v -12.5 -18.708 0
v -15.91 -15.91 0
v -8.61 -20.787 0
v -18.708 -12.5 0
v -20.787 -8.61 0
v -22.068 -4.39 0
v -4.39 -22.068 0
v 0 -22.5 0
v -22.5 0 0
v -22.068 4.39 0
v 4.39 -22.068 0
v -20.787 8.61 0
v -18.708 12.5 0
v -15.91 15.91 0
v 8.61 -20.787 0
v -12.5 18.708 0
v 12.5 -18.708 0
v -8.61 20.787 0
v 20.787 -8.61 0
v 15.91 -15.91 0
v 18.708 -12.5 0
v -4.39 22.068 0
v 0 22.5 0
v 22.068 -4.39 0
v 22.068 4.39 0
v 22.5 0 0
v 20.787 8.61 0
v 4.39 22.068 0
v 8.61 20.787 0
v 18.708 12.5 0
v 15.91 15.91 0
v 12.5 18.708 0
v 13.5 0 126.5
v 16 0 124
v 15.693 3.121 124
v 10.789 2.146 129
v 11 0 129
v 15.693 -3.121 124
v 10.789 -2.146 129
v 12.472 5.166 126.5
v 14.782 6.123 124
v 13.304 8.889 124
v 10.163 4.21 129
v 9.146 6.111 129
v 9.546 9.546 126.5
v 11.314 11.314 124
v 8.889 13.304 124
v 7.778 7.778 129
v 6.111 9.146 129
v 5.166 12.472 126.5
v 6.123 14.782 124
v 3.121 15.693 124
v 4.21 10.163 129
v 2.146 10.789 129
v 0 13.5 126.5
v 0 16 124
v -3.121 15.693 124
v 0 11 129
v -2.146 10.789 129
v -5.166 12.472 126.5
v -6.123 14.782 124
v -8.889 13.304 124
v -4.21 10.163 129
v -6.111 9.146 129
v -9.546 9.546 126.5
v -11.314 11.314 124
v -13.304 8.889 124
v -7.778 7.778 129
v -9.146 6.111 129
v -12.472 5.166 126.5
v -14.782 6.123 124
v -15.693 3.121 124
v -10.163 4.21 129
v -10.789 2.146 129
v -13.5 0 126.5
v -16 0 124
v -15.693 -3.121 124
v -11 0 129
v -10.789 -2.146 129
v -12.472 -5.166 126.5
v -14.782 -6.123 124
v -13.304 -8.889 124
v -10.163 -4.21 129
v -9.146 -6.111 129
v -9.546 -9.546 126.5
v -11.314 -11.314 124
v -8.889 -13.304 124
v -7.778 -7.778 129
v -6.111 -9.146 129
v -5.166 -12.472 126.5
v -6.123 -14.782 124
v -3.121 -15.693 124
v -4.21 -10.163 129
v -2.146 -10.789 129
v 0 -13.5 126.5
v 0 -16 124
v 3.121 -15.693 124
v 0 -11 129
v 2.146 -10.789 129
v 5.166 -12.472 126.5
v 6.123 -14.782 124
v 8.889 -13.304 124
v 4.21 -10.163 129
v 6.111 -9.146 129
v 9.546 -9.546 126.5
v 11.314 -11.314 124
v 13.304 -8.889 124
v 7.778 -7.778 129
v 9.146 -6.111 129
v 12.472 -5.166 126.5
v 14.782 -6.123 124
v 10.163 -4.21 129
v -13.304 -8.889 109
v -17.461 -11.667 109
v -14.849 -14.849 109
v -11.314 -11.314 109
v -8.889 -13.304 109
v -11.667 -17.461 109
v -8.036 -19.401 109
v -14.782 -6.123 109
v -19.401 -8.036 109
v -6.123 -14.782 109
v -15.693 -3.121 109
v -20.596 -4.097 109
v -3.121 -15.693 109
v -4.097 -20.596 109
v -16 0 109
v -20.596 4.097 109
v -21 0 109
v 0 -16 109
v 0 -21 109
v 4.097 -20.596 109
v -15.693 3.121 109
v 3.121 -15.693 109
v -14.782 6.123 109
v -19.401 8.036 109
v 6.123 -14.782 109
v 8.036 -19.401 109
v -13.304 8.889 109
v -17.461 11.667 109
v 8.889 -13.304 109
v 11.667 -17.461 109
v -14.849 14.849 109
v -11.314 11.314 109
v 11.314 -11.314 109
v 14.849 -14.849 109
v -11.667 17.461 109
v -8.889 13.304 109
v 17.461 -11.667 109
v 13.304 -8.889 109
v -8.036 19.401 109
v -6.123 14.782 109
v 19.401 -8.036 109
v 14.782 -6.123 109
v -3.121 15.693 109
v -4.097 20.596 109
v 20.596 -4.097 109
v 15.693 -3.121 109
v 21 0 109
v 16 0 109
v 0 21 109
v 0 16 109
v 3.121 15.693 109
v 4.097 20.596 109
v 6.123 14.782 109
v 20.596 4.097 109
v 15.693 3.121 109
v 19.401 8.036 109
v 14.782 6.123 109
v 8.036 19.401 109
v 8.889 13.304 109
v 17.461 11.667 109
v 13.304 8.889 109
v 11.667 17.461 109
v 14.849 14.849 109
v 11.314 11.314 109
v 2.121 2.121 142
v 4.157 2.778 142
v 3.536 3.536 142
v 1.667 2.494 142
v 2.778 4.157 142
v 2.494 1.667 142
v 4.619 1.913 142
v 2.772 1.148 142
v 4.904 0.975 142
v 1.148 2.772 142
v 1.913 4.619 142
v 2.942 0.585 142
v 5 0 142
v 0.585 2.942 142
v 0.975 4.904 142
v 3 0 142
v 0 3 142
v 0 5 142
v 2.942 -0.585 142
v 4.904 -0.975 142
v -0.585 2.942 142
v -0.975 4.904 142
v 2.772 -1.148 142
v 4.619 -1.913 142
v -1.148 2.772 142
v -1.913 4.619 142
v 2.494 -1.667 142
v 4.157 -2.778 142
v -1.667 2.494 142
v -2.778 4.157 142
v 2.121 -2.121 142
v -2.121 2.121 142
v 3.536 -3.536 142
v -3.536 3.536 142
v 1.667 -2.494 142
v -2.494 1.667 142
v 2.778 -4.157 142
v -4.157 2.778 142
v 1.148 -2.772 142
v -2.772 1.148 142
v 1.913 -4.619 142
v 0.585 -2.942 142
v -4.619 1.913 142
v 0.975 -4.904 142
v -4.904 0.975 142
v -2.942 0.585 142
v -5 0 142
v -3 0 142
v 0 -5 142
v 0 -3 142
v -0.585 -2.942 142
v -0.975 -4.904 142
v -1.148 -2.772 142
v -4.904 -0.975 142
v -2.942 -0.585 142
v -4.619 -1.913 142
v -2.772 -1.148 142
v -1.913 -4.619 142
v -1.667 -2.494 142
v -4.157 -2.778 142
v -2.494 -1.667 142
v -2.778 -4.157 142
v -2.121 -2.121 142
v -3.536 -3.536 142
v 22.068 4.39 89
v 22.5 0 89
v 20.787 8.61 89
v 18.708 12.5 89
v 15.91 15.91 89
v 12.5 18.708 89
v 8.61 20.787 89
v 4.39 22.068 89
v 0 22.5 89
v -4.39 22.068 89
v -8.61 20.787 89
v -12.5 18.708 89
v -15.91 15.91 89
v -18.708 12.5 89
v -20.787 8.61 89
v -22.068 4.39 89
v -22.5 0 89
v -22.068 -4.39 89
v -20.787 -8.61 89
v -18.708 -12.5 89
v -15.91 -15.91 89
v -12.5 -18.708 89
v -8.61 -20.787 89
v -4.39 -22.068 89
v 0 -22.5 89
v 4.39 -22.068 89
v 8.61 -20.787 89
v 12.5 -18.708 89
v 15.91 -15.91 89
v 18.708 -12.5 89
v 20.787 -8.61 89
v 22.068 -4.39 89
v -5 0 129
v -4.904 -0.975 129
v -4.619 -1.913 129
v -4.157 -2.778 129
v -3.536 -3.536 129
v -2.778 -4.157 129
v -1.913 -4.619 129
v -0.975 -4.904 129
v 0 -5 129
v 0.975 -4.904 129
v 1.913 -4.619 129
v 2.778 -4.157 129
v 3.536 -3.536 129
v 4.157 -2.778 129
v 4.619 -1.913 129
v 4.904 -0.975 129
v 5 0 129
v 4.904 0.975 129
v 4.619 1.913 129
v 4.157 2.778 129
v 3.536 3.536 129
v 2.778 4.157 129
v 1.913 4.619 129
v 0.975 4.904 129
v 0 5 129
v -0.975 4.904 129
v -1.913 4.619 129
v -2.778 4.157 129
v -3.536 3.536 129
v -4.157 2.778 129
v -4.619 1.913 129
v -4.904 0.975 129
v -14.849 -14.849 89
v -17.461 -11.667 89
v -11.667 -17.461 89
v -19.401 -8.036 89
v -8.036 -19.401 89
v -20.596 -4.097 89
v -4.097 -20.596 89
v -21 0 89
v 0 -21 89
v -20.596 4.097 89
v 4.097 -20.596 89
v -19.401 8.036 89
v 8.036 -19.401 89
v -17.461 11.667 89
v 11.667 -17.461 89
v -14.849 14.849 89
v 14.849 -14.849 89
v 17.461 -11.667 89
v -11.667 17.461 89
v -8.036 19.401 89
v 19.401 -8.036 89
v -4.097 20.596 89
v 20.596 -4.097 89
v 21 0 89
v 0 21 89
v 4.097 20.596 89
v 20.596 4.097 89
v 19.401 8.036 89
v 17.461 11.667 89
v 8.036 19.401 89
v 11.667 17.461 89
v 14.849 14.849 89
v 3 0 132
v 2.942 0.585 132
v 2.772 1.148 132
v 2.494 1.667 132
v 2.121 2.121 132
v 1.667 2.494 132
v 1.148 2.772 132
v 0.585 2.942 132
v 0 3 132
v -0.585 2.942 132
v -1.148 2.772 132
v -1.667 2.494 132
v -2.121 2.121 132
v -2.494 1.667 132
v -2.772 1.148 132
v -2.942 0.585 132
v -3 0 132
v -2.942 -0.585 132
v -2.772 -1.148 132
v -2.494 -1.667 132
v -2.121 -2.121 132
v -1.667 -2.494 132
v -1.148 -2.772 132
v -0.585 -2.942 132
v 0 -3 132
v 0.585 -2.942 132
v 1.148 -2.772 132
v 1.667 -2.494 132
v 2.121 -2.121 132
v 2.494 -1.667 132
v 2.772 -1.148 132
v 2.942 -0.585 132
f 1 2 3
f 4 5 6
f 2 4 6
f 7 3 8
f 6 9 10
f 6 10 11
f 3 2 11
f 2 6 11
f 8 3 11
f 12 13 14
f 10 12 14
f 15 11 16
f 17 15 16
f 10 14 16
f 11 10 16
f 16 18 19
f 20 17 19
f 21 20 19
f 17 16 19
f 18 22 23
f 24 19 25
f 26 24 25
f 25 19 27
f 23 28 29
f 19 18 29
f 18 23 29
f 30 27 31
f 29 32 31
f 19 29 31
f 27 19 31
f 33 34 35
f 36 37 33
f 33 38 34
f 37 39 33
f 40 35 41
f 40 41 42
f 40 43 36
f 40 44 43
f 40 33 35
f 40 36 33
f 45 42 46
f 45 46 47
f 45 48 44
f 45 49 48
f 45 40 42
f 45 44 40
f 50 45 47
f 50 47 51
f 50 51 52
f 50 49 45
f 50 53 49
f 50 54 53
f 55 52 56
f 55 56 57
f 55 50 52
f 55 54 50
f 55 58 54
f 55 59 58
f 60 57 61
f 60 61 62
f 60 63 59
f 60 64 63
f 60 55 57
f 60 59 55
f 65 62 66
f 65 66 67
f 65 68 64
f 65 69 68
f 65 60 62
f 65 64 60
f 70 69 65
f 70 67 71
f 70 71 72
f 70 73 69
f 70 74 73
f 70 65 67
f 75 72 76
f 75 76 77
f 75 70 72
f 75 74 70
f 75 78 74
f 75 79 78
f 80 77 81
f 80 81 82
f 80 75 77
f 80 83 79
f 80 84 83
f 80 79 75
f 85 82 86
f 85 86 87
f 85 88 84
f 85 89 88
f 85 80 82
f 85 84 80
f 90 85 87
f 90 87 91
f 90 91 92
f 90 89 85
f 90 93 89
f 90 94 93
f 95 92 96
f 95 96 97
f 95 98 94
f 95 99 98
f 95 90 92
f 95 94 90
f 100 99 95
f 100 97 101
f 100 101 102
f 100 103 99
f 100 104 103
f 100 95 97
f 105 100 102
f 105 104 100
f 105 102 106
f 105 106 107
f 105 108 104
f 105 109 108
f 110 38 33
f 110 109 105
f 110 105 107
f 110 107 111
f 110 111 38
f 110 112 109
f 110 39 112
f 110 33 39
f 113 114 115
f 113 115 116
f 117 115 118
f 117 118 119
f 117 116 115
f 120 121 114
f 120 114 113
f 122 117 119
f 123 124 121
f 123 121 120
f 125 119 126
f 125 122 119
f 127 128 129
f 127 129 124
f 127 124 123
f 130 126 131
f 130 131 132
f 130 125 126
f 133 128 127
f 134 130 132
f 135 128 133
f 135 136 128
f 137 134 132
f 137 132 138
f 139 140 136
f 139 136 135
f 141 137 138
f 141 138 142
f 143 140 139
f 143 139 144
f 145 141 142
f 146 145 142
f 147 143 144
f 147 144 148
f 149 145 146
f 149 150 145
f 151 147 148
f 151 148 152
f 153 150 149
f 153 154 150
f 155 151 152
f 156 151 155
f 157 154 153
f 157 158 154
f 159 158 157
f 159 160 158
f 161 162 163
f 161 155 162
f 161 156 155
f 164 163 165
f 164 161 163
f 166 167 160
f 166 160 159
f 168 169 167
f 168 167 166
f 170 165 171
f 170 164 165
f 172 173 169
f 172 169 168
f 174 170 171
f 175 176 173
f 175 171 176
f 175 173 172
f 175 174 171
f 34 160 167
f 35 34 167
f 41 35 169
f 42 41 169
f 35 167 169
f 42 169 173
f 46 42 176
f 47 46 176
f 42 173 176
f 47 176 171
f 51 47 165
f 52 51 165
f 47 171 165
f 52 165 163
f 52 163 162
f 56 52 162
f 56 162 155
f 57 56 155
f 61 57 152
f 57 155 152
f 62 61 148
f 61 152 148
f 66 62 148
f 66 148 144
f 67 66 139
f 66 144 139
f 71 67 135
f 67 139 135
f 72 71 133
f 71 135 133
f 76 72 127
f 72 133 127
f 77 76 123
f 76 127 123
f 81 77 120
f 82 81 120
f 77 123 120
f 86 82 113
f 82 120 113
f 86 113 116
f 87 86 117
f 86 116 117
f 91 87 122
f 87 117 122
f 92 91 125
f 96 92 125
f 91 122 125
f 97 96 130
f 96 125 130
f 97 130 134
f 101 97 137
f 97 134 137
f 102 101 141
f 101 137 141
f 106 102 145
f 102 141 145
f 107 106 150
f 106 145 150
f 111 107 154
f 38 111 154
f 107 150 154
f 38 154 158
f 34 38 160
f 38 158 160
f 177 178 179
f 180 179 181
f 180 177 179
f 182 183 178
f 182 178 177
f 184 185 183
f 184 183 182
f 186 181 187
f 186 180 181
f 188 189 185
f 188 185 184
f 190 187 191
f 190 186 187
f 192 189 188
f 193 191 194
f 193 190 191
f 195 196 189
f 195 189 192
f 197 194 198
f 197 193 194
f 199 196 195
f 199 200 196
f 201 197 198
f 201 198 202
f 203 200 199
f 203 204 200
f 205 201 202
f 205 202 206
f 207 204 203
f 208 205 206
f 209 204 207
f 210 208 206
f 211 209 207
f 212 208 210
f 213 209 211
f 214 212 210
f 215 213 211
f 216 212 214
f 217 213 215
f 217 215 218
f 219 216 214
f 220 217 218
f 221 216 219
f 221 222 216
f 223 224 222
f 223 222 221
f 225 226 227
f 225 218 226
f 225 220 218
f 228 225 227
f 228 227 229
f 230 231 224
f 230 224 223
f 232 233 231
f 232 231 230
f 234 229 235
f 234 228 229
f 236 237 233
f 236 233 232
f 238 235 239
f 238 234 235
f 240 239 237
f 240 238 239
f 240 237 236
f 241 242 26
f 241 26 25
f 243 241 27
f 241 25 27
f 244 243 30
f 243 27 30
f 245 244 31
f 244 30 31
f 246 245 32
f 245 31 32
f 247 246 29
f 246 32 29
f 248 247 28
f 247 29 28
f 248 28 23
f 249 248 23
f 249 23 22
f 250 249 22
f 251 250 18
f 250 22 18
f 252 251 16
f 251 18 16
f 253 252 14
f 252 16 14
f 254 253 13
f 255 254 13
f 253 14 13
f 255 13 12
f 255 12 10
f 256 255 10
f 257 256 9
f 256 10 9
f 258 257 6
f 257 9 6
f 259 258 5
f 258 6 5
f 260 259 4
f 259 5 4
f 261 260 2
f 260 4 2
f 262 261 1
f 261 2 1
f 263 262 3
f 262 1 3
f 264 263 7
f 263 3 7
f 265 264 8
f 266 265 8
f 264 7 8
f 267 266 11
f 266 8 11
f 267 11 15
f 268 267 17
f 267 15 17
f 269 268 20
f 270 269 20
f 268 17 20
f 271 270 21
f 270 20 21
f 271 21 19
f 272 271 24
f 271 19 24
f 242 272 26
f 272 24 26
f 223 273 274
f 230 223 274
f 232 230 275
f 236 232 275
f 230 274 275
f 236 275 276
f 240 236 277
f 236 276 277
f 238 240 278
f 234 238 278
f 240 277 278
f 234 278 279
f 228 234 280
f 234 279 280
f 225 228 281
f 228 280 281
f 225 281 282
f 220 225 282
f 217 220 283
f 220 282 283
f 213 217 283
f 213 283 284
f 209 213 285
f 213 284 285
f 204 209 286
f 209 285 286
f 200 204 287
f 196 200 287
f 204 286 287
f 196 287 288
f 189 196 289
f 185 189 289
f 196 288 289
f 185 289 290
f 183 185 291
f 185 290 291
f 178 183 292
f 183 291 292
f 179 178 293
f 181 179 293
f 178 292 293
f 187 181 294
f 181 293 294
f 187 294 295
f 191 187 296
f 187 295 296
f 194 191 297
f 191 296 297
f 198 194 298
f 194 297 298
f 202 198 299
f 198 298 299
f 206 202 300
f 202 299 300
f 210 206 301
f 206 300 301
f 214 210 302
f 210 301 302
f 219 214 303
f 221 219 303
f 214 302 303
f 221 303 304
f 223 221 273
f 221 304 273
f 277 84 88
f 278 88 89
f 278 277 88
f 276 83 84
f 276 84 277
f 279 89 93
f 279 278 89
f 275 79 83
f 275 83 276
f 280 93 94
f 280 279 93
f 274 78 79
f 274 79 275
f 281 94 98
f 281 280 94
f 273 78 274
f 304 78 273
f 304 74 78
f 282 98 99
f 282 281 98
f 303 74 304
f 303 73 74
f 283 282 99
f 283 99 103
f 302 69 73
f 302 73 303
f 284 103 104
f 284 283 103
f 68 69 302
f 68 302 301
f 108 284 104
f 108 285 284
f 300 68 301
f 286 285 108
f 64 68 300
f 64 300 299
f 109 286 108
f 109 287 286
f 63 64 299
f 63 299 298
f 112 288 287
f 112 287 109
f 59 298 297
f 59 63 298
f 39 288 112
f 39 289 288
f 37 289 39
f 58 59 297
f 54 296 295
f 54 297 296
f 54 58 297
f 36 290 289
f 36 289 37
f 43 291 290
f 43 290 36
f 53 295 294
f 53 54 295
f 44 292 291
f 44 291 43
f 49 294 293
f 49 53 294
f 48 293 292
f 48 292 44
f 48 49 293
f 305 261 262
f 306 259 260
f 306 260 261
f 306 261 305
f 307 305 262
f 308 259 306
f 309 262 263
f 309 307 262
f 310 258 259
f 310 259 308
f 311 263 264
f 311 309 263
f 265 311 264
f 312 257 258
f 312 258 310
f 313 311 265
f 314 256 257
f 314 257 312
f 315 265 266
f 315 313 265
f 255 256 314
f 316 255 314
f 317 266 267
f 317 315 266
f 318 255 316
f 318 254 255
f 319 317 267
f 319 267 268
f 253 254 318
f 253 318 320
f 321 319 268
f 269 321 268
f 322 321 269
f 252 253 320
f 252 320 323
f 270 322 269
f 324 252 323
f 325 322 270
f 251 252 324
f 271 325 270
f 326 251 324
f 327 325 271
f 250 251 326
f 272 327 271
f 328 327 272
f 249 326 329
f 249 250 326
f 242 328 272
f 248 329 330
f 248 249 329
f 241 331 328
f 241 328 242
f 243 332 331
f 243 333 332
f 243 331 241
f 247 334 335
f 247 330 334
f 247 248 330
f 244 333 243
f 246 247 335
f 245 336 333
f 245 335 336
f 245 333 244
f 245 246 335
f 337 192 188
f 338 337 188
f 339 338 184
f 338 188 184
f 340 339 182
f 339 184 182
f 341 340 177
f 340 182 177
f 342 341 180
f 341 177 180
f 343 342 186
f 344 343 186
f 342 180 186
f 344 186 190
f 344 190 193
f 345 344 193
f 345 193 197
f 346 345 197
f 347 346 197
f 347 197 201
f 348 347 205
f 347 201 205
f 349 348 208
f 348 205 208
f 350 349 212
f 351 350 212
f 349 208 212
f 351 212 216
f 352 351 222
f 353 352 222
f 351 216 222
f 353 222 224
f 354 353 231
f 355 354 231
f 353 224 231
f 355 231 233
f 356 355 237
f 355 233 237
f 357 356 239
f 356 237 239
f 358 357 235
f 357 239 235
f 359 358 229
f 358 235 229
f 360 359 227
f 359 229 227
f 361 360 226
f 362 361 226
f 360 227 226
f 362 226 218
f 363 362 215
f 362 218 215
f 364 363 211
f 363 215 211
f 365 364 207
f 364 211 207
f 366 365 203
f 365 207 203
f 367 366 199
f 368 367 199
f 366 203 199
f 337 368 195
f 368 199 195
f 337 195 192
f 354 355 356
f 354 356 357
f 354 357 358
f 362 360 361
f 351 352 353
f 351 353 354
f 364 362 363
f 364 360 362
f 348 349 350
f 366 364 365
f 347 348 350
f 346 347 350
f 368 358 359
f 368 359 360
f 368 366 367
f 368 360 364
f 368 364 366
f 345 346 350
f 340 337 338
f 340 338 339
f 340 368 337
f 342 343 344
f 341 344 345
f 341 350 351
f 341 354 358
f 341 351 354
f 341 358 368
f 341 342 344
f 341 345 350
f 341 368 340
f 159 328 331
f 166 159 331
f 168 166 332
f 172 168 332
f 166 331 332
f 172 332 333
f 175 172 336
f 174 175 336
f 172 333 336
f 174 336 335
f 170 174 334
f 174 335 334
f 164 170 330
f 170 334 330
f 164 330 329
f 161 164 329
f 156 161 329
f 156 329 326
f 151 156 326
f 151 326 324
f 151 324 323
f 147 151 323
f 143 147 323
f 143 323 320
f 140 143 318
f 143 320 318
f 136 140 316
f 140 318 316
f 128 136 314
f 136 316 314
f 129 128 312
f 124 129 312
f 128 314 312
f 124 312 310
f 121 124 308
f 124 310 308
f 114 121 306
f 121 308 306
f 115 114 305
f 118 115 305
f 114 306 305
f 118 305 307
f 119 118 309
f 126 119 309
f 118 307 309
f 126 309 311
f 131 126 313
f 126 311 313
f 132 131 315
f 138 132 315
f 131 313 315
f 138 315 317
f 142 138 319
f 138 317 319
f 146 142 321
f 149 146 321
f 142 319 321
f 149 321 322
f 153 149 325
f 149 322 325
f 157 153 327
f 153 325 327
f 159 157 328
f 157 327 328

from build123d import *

# Parameters (mm, degrees)
SKETCH1_R           = 22.5
BOSS_EXTRUDE1_DEPTH = 89
SKETCH2_R           = 21
BOSS_EXTRUDE2_DEPTH = 20
SKETCH3_R           = 16
BOSS_EXTRUDE3_DEPTH = 20
CHAMFER1_SIZE       = 5
SKETCH4_R           = 5
BOSS_EXTRUDE4_DEPTH = 13
SKETCH5_R           = 3
CUT_EXTRUDE1_DEPTH  = 10


with BuildPart() as part:
    # Sketch1 → Boss-Extrude1 (new body)
    with BuildSketch(Plane.XY):
        Circle(SKETCH1_R)
    extrude(amount=BOSS_EXTRUDE1_DEPTH)

    # Sketch2 → Boss-Extrude2 (add)
    with BuildSketch(Plane.XY.offset(89)):
        Circle(SKETCH2_R)
    extrude(amount=BOSS_EXTRUDE2_DEPTH)

    # Sketch3 → Boss-Extrude3 (add)
    with BuildSketch(Plane.XY.offset(109)):
        Circle(SKETCH3_R)
    extrude(amount=BOSS_EXTRUDE3_DEPTH)

    # Chamfer1
    chamfer1_edges = [part.edges().sort_by_distance(p)[0] for p in [
        (-16, 0, 129),
    ]]
    chamfer(chamfer1_edges, length=CHAMFER1_SIZE)

    # Sketch4 → Boss-Extrude4 (add)
    with BuildSketch(Plane.XY.offset(129)):
        with Locations(Location((0, 0, 0), (0, 0, 180))):
            Circle(SKETCH4_R)
    extrude(amount=BOSS_EXTRUDE4_DEPTH)

    # Sketch5 → Cut-Extrude1 (cut)
    with BuildSketch(Plane.XY.offset(142)):
        Circle(SKETCH5_R)
    extrude(amount=-CUT_EXTRUDE1_DEPTH, mode=Mode.SUBTRACT)


solid = part.part
